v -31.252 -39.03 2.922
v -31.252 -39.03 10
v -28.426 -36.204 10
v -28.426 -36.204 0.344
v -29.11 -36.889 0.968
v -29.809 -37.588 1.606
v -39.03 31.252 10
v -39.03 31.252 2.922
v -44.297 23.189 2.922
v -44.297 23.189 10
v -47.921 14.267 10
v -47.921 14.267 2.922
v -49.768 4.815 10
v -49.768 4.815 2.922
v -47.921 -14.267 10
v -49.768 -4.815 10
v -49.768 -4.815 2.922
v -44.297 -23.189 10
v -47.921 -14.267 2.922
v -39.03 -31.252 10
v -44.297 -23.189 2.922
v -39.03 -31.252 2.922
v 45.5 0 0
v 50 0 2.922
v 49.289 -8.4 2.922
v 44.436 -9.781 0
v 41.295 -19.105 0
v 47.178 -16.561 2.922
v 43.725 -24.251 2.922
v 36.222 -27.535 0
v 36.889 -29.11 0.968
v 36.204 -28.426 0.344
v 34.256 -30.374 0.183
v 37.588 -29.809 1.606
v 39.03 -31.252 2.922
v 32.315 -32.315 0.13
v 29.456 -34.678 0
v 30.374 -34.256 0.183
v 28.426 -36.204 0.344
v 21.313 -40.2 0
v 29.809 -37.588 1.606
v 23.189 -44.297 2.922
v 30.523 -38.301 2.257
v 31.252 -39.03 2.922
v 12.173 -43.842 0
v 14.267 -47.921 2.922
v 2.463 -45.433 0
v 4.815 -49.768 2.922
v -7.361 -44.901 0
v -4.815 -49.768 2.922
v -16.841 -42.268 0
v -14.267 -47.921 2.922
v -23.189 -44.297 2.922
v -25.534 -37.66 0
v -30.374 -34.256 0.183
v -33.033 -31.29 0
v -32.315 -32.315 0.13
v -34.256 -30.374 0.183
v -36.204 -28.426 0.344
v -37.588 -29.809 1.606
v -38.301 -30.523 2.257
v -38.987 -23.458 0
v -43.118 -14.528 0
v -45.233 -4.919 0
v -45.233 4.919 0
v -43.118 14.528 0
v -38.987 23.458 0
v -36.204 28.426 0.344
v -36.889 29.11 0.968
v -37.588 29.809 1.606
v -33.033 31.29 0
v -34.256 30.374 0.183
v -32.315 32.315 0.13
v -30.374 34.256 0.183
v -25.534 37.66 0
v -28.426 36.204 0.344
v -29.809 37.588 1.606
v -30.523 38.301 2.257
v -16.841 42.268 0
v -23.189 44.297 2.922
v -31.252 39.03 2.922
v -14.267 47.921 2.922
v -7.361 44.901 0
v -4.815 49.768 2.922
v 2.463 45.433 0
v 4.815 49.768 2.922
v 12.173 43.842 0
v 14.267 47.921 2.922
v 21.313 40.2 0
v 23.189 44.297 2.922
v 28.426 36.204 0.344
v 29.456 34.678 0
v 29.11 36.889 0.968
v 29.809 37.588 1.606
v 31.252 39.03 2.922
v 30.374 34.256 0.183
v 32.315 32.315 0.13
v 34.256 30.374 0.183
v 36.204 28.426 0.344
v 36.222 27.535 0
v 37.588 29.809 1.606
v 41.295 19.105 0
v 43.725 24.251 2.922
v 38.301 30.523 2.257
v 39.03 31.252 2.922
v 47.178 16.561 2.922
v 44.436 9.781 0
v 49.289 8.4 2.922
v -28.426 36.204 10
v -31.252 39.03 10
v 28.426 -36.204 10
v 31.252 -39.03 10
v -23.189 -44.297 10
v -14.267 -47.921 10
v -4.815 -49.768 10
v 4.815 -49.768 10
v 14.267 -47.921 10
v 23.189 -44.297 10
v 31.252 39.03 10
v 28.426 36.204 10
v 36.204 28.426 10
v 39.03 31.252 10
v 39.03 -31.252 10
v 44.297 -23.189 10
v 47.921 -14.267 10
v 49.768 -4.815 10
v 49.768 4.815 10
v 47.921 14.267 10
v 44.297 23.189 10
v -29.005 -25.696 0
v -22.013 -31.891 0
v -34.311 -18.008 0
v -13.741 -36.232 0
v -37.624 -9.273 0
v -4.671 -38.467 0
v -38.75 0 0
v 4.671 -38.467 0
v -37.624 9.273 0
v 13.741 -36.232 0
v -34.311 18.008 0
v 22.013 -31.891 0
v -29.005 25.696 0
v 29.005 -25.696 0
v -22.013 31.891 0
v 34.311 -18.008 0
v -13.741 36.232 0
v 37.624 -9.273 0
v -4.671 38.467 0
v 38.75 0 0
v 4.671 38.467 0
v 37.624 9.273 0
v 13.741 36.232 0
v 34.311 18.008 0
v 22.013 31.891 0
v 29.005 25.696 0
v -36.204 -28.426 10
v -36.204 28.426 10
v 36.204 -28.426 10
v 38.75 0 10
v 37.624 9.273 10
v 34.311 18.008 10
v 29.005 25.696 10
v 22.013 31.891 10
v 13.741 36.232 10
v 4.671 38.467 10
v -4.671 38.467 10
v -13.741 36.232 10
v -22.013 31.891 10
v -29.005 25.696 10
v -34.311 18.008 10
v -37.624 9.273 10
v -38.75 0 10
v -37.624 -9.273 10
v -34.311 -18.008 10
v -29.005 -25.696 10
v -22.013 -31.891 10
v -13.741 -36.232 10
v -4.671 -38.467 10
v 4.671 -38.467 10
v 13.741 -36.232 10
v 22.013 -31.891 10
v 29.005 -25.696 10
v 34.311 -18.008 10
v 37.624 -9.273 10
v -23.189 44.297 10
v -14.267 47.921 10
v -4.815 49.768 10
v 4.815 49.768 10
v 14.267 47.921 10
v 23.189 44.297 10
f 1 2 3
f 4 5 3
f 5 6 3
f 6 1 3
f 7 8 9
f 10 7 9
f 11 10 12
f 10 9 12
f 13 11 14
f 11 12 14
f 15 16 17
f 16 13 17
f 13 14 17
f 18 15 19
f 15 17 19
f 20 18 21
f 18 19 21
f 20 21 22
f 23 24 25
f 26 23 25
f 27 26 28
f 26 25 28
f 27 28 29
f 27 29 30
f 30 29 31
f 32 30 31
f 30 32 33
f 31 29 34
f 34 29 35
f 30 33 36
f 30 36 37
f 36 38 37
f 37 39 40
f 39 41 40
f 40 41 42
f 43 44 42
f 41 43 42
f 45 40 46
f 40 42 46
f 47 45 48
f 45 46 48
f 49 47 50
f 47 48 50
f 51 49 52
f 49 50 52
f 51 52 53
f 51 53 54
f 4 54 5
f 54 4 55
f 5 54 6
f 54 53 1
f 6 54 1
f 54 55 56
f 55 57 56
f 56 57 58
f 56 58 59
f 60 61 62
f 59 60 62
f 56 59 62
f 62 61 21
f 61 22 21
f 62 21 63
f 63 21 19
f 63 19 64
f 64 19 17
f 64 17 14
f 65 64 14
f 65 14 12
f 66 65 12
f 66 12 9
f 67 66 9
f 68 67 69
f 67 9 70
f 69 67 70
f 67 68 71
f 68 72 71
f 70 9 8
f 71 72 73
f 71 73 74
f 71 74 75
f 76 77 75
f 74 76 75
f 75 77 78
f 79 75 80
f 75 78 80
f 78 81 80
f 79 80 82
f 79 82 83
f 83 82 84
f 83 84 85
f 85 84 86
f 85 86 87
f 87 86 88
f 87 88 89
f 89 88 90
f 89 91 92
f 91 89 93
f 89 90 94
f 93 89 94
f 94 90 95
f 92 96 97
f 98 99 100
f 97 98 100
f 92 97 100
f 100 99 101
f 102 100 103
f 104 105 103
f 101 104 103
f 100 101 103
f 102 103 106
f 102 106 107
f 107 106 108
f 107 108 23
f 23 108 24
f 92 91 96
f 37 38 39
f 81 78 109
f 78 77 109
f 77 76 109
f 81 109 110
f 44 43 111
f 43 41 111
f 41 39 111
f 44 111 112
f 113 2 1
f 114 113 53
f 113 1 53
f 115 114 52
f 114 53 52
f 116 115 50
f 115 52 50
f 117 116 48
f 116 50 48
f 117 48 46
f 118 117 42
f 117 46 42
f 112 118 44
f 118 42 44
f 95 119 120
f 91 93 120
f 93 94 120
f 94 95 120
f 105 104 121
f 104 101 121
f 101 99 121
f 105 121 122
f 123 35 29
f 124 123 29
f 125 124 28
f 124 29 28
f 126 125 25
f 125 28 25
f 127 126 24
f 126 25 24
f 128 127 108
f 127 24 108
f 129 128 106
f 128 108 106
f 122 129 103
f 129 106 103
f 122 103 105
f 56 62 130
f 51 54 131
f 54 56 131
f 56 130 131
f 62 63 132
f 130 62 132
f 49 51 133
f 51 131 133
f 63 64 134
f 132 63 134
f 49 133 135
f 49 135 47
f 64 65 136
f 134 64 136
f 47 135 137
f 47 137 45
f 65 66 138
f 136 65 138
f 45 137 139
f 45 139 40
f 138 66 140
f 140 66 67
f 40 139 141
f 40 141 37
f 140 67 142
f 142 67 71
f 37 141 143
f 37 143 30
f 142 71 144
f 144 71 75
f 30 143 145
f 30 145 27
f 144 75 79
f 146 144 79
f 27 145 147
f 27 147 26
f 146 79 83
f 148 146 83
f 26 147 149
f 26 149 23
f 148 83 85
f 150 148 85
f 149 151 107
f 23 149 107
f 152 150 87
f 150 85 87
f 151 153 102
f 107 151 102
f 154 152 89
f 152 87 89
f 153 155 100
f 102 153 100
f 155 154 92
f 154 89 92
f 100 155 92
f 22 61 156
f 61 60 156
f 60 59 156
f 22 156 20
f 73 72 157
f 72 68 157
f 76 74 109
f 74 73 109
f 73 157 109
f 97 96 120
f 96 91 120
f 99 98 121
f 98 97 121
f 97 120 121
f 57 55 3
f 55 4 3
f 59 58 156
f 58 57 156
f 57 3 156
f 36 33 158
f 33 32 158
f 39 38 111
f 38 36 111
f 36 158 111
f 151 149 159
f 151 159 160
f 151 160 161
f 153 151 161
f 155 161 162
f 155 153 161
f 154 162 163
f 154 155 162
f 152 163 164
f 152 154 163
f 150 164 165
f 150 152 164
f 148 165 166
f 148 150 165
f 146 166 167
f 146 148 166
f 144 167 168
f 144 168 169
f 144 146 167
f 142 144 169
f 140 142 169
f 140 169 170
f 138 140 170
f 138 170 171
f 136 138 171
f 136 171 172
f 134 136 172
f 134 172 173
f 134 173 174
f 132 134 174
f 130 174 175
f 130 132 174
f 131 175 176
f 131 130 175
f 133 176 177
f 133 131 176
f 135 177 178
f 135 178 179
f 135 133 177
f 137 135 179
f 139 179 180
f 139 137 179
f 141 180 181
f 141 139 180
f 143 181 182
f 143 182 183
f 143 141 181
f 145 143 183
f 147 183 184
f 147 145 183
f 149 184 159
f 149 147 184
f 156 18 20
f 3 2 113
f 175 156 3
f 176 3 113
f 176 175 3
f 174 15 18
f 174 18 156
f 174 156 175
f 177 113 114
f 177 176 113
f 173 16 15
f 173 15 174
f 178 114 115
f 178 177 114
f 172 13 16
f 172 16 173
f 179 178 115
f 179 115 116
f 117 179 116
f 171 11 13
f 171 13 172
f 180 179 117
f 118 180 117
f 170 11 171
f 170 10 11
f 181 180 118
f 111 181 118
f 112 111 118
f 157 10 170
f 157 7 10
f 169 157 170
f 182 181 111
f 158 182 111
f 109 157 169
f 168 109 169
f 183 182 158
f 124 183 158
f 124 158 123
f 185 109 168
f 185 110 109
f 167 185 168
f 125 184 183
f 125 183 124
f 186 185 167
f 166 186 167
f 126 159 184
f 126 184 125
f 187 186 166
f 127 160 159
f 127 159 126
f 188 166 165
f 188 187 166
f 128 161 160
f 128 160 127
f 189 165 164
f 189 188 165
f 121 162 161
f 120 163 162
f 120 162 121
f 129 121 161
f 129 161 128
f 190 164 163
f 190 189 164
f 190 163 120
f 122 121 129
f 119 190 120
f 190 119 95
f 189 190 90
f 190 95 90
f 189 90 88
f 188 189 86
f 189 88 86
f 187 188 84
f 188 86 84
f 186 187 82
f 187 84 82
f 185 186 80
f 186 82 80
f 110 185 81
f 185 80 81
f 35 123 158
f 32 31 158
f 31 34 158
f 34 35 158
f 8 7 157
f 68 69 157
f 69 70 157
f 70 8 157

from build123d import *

# Parameters (mm, degrees)
SKETCH1_R          = 50
SKETCH1_R_2        = 38.75
EXTRUDE1_DEPTH     = 10
CUT_EXTRUDE1_DEPTH = 11
CIRPATTERN1_COUNT  = 4


with BuildPart() as part:
    # Sketch1 → Extrude1 (new body)
    with BuildSketch(Plane.XY):
        Circle(SKETCH1_R)
        Circle(SKETCH1_R_2, mode=Mode.SUBTRACT)
    extrude(amount=EXTRUDE1_DEPTH)

    # Sketch2 → Cut-Extrude1 (cut, through all)
    with BuildSketch(Plane.XY.offset(10)):
        with BuildLine():
            Line((31.25170097, 39.029875563), (28.425692604, 36.203867197))
            Line((28.425692604, 36.203867197), (36.203867197, 28.425692604))
            Line((36.203867197, 28.425692604), (39.029875563, 31.25170097))
            ThreePointArc((39.029875563, 31.25170097), (35.355339059, 35.355339059), (31.25170097, 39.029875563))
        make_face()
    cut_extrude1 = extrude(amount=-CUT_EXTRUDE1_DEPTH, mode=Mode.SUBTRACT)

    # CirPattern1: Cut-Extrude1 ×4 about axis
    cirpattern1_axis = Axis((0, 0, 0), (0, 0, 1))
    for i in range(1, CIRPATTERN1_COUNT):
        add(cut_extrude1.rotate(cirpattern1_axis, i * 360 / CIRPATTERN1_COUNT), mode=Mode.SUBTRACT)

    # Sketch3 → Cut-Revolve1 (revolve, cut)
    with BuildSketch(Plane(origin=(0, 0, 0), x_dir=(1, 0, 0), z_dir=(0, 1, 0))):
        Polygon((50, 0), (45.5, 0), (50, -2.922334169), align=None)
    revolve(axis=Axis((0, 0, 0), (0, 0, -1)), mode=Mode.SUBTRACT)


solid = part.part
